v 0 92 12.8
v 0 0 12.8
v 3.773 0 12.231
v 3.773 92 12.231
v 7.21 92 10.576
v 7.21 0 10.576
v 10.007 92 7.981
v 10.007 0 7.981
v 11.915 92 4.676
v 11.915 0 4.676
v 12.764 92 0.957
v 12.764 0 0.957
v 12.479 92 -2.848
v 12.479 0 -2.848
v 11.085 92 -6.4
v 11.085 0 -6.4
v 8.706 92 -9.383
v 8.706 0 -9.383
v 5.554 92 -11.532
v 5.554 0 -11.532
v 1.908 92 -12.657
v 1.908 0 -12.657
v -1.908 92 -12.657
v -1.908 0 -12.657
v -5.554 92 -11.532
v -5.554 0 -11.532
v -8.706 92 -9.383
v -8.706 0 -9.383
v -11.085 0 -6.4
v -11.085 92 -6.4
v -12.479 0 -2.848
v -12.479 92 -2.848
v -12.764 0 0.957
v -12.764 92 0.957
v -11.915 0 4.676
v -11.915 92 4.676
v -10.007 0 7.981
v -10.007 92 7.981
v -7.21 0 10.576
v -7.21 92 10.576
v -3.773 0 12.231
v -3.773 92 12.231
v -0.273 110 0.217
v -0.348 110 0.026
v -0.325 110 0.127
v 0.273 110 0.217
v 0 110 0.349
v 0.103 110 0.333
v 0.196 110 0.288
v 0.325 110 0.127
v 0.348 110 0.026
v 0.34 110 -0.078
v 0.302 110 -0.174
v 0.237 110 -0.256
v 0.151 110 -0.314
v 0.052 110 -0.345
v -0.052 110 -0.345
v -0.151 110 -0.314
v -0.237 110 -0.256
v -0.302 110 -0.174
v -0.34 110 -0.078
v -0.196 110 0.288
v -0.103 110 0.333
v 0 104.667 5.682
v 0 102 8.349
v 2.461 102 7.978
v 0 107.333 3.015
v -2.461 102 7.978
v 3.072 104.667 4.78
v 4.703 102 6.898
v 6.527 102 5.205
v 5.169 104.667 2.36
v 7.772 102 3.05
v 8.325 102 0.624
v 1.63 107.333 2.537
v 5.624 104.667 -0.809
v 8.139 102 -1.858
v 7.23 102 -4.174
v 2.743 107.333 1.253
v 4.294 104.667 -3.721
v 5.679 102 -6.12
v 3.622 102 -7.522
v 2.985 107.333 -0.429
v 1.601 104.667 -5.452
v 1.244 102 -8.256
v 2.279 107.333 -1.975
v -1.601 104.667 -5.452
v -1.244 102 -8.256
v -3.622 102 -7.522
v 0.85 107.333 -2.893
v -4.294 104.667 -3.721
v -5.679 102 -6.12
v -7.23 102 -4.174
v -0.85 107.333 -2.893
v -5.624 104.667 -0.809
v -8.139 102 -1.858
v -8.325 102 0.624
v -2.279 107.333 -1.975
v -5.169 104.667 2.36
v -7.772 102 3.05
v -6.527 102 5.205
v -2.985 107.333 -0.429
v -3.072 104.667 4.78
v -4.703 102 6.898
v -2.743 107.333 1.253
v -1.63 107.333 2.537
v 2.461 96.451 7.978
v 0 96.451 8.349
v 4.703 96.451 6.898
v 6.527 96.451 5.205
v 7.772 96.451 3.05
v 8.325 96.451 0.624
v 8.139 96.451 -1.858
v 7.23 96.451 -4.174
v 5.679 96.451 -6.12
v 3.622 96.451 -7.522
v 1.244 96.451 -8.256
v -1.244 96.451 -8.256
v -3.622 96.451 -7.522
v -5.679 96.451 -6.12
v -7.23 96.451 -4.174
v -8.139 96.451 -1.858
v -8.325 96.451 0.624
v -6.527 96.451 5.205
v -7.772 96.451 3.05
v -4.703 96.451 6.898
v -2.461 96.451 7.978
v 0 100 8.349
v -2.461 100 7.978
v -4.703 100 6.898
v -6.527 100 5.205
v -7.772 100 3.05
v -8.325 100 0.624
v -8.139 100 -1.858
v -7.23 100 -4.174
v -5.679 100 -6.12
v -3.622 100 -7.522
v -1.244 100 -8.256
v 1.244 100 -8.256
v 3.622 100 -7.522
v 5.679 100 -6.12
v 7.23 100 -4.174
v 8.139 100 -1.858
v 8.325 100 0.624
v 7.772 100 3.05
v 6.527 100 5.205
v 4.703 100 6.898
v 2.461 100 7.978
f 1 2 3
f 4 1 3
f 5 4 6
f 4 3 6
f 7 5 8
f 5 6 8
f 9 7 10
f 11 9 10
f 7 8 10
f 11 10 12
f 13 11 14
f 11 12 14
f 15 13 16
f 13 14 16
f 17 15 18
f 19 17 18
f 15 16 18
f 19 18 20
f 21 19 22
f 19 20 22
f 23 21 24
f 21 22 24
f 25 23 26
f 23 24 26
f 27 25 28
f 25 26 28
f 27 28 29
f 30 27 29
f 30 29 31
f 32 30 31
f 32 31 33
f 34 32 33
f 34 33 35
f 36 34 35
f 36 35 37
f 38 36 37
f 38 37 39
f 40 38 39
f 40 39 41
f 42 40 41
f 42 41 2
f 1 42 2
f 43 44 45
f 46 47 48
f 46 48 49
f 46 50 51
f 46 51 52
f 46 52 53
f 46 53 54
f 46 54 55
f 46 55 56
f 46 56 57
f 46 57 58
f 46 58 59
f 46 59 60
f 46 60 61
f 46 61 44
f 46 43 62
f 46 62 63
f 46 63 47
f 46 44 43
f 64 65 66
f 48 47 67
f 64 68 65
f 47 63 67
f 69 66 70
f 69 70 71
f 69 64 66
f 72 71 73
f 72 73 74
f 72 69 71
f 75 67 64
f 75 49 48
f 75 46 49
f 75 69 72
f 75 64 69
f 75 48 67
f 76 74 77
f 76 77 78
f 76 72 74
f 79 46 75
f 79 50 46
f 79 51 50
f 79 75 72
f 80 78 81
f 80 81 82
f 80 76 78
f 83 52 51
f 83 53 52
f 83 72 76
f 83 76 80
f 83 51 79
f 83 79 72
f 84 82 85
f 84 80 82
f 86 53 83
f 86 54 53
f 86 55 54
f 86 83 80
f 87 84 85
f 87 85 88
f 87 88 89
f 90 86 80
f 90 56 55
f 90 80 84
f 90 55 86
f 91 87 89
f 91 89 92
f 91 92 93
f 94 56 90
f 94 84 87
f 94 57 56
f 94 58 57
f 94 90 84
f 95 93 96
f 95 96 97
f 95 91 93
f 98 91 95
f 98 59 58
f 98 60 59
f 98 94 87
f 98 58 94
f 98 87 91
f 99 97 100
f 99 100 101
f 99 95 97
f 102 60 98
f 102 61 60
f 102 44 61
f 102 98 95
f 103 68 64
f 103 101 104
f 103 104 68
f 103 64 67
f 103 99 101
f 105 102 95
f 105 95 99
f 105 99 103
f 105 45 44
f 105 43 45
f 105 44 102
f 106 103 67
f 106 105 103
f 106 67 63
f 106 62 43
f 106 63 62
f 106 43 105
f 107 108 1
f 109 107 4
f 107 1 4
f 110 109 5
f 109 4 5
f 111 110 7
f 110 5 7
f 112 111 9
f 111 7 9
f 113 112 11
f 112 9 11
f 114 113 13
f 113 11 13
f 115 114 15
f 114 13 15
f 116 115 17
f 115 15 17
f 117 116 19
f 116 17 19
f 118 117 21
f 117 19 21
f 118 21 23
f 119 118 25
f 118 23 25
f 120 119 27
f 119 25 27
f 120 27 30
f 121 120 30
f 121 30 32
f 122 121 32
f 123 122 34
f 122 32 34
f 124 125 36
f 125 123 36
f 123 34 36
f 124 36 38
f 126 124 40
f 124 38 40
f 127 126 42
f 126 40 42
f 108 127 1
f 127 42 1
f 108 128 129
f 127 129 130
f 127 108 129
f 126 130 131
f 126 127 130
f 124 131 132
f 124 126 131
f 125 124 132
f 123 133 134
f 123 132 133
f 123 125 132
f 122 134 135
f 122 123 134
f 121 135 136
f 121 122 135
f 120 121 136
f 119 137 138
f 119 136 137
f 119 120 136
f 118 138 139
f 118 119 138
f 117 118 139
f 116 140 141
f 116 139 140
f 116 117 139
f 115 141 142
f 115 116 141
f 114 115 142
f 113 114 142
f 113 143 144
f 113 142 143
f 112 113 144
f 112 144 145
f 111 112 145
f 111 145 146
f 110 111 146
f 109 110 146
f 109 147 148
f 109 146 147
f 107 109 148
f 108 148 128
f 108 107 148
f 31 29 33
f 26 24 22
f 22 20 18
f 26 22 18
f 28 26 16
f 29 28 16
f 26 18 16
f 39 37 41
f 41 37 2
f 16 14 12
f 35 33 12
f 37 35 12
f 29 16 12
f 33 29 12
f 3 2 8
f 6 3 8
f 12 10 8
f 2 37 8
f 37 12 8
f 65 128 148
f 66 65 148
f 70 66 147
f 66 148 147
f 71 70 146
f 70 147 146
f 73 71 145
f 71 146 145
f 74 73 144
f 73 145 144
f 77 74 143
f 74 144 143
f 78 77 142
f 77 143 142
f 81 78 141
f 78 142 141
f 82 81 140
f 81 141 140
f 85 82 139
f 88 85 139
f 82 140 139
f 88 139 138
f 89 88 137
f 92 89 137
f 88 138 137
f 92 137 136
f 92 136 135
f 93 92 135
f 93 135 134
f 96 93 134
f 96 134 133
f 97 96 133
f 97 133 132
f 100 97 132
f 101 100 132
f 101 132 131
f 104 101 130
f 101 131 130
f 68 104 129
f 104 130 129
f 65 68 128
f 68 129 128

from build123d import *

# Parameters (mm, degrees)
SKETCH1_R           = 12.8
BOSS_EXTRUDE1_DEPTH = 100
SKETCH3_R           = 8.348764046
BOSS_EXTRUDE3_DEPTH = 10
CHAMFER3_SIZE       = 8
CHAMFER4_SIZE       = 8


with BuildPart() as part:
    # Sketch1 → Boss-Extrude1 (new body)
    with BuildSketch(Plane(origin=(0, 0, 0), x_dir=(1, 0, 0), z_dir=(0, 1, 0))):
        with Locations(Location((0, 0, 0), (0, 0, 270))):
            Circle(SKETCH1_R)
    extrude(amount=BOSS_EXTRUDE1_DEPTH)

    # Sketch3 → Boss-Extrude3 (add)
    with BuildSketch(Plane(origin=(0, 100, 0), x_dir=(1, 0, 0), z_dir=(0, 1, 0))):
        with Locations(Location((0, 0, 0), (0, 0, 270))):
            Circle(SKETCH3_R)
    extrude(amount=BOSS_EXTRUDE3_DEPTH)

    # Chamfer3
    chamfer3_edges = [part.edges().sort_by_distance(p)[0] for p in [
        (0, 110, -8.348764046),
    ]]
    chamfer(chamfer3_edges, length=CHAMFER3_SIZE)

    # Chamfer4
    # the kernel refuses this chamfer: 8 mm, written as the material it takes off along each edge
    with BuildSketch(Plane(origin=(0, 100, 0), x_dir=(0, 0, 1), z_dir=(-1, 0, 0))) as chamfer4_piece_1_section:
        Polygon((12.8 - CHAMFER4_SIZE, 0), (12.8, -CHAMFER4_SIZE), (12.8, 0), align=None)
    chamfer4_piece_1 = revolve(axis=Axis((0, 100, 0), (0, 1, 0)), mode=Mode.PRIVATE)
    chamfer4_piece_1 = chamfer4_piece_1 - Plane(origin=(0, 94.200473473, 0), x_dir=(0, 0, 1), z_dir=(0, -1, 0)) * Cylinder(8.348764046, 52, mode=Mode.PRIVATE)
    add(chamfer4_piece_1, mode=Mode.SUBTRACT)


solid = part.part
